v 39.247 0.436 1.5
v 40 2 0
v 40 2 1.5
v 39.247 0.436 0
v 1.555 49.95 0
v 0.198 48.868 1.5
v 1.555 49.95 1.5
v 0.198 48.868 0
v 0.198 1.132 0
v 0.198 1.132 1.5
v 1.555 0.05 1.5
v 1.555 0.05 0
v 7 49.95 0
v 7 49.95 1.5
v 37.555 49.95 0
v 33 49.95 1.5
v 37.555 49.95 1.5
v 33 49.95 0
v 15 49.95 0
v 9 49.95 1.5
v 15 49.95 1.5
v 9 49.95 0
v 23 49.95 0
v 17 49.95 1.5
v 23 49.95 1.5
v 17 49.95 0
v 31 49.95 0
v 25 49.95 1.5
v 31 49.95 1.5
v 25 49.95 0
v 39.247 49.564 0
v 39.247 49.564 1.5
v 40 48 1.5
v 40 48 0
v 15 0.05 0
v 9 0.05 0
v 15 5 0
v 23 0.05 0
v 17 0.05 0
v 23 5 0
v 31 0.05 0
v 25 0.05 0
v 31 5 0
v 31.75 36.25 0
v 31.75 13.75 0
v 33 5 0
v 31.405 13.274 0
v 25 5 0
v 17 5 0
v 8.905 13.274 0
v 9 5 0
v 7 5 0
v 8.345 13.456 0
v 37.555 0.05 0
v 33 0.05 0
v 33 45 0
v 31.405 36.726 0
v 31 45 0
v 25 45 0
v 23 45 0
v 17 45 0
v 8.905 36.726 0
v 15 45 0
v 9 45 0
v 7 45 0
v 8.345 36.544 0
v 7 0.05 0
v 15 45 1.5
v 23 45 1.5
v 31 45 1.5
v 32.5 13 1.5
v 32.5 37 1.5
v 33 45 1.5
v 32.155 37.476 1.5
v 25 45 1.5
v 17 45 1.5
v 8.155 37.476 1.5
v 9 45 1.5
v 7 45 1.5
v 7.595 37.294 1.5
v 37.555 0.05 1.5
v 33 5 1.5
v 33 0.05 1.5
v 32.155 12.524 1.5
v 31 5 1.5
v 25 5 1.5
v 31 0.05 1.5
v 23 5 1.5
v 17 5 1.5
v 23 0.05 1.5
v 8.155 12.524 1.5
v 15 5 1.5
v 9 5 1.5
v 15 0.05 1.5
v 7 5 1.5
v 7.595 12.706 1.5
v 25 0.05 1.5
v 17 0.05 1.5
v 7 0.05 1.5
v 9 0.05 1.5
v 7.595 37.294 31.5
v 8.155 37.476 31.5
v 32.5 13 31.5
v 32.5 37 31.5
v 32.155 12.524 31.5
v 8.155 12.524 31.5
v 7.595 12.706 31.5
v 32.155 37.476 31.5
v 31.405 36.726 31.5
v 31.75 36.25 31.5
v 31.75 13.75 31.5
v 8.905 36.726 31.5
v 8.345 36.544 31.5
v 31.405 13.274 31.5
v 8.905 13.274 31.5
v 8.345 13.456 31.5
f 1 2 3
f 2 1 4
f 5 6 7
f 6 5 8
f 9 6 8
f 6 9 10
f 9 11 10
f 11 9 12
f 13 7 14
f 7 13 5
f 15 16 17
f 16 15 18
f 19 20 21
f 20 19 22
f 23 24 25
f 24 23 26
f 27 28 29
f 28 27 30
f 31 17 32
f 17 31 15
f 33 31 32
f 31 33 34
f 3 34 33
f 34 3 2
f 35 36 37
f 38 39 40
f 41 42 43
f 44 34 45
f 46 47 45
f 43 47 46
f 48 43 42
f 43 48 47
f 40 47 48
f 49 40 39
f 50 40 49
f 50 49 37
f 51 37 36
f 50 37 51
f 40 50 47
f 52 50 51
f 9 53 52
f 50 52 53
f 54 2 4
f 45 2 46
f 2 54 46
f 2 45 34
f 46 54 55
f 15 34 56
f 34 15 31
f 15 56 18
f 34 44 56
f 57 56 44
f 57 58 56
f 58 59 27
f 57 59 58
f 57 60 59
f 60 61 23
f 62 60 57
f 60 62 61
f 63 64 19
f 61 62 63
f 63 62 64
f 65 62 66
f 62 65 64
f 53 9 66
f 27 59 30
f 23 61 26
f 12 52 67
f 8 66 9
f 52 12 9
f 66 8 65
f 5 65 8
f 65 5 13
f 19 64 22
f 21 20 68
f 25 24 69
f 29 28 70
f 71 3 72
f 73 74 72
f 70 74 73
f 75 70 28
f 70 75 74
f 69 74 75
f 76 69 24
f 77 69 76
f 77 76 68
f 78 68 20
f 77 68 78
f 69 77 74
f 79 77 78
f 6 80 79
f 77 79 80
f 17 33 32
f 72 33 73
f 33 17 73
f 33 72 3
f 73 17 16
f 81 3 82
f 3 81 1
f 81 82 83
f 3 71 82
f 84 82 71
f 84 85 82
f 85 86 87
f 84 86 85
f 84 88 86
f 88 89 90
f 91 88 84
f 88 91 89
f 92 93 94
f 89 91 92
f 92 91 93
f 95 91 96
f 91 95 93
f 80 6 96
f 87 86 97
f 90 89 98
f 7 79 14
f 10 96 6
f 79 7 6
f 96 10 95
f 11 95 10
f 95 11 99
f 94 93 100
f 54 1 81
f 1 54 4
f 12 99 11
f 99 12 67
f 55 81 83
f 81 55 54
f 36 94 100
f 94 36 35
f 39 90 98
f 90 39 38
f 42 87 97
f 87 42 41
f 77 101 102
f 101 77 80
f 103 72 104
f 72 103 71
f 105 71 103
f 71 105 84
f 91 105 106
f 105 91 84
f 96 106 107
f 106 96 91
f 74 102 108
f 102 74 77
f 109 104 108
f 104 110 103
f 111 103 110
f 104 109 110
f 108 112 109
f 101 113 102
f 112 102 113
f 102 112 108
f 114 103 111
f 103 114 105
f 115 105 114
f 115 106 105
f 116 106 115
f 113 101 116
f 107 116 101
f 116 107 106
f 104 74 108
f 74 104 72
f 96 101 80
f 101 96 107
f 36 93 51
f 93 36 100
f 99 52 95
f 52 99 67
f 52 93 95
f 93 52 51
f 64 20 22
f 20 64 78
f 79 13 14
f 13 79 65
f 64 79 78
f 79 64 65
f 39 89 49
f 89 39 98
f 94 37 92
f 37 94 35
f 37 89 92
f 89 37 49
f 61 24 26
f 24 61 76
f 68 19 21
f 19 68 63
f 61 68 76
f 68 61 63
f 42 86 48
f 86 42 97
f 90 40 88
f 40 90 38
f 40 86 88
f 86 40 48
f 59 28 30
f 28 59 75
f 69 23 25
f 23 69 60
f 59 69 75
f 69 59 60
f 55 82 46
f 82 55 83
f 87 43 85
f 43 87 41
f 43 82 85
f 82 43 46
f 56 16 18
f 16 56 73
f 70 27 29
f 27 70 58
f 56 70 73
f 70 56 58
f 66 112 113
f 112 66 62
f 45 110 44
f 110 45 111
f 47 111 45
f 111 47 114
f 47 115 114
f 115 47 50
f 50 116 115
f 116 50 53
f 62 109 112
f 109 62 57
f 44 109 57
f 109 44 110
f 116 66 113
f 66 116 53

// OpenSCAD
/* [Flange] */
flange_x = 40;
flange_y = 50;
flange_z = 1.5;
flange_radius = 2;

/* [Core Area] */
core_inside_x = 23.5;
core_inside_y = 23.5;
core_wall = 0.75;
core_z = 30;
core_radius = 0.5;

/* [Notches] */
notch_count = 4;
notch_width = 2;
notch_depth = 5;  // How far the notch cuts into the flange from the edge

module roundedcube(xdim, ydim, zdim, rdim){
    hull(){
        translate([rdim,rdim,0])cylinder(h=zdim,r=rdim);
        translate([xdim-rdim,rdim,0])cylinder(h=zdim,r=rdim);
        translate([rdim,ydim-rdim,0])cylinder(h=zdim,r=rdim);
        translate([xdim-rdim,ydim-rdim,0])cylinder(h=zdim,r=rdim);
    }
}

module mirror_copy(v) {
    children();
    mirror(v) children();
}

module notches() {
    step = flange_x / (notch_count + 1);
    for (x = [step : step : flange_x - step]) {
        // Front edge (Y=0) - notch cuts inward from outside
        translate([x - notch_width/2, -1, -0.01])
            cube([notch_width, notch_depth + 1, flange_z + 0.02]);
        // Back edge (Y=flange_y) - notch cuts inward from outside
        translate([x - notch_width/2, flange_y - notch_depth, -0.01])
            cube([notch_width, notch_depth + 1, flange_z + 0.02]);
    }
}

// Calculate core outside dimensions from inside + wall
core_x = core_inside_x + 2 * core_wall;
core_y = core_inside_y + 2 * core_wall;

// Calculate core position (centered on flange)
core_offset_x = (flange_x - core_x) / 2;
core_offset_y = (flange_y - core_y) / 2;

// Calculate hole position (centered on flange)
hole_offset_x = (flange_x - core_inside_x) / 2;
hole_offset_y = (flange_y - core_inside_y) / 2;

difference(){
    union(){
        roundedcube(flange_x, flange_y, flange_z, flange_radius);
        translate([core_offset_x, core_offset_y, flange_z])
            roundedcube(core_x, core_y, core_z, core_radius);
    }
    // Rectangular hole (inside dimensions of core area)
    translate([hole_offset_x, hole_offset_y, -1])
        roundedcube(core_inside_x, core_inside_y, flange_z + core_z + 2, core_radius);
    // Flange notches on front/back (Y-axis edges)
    notches();
}
